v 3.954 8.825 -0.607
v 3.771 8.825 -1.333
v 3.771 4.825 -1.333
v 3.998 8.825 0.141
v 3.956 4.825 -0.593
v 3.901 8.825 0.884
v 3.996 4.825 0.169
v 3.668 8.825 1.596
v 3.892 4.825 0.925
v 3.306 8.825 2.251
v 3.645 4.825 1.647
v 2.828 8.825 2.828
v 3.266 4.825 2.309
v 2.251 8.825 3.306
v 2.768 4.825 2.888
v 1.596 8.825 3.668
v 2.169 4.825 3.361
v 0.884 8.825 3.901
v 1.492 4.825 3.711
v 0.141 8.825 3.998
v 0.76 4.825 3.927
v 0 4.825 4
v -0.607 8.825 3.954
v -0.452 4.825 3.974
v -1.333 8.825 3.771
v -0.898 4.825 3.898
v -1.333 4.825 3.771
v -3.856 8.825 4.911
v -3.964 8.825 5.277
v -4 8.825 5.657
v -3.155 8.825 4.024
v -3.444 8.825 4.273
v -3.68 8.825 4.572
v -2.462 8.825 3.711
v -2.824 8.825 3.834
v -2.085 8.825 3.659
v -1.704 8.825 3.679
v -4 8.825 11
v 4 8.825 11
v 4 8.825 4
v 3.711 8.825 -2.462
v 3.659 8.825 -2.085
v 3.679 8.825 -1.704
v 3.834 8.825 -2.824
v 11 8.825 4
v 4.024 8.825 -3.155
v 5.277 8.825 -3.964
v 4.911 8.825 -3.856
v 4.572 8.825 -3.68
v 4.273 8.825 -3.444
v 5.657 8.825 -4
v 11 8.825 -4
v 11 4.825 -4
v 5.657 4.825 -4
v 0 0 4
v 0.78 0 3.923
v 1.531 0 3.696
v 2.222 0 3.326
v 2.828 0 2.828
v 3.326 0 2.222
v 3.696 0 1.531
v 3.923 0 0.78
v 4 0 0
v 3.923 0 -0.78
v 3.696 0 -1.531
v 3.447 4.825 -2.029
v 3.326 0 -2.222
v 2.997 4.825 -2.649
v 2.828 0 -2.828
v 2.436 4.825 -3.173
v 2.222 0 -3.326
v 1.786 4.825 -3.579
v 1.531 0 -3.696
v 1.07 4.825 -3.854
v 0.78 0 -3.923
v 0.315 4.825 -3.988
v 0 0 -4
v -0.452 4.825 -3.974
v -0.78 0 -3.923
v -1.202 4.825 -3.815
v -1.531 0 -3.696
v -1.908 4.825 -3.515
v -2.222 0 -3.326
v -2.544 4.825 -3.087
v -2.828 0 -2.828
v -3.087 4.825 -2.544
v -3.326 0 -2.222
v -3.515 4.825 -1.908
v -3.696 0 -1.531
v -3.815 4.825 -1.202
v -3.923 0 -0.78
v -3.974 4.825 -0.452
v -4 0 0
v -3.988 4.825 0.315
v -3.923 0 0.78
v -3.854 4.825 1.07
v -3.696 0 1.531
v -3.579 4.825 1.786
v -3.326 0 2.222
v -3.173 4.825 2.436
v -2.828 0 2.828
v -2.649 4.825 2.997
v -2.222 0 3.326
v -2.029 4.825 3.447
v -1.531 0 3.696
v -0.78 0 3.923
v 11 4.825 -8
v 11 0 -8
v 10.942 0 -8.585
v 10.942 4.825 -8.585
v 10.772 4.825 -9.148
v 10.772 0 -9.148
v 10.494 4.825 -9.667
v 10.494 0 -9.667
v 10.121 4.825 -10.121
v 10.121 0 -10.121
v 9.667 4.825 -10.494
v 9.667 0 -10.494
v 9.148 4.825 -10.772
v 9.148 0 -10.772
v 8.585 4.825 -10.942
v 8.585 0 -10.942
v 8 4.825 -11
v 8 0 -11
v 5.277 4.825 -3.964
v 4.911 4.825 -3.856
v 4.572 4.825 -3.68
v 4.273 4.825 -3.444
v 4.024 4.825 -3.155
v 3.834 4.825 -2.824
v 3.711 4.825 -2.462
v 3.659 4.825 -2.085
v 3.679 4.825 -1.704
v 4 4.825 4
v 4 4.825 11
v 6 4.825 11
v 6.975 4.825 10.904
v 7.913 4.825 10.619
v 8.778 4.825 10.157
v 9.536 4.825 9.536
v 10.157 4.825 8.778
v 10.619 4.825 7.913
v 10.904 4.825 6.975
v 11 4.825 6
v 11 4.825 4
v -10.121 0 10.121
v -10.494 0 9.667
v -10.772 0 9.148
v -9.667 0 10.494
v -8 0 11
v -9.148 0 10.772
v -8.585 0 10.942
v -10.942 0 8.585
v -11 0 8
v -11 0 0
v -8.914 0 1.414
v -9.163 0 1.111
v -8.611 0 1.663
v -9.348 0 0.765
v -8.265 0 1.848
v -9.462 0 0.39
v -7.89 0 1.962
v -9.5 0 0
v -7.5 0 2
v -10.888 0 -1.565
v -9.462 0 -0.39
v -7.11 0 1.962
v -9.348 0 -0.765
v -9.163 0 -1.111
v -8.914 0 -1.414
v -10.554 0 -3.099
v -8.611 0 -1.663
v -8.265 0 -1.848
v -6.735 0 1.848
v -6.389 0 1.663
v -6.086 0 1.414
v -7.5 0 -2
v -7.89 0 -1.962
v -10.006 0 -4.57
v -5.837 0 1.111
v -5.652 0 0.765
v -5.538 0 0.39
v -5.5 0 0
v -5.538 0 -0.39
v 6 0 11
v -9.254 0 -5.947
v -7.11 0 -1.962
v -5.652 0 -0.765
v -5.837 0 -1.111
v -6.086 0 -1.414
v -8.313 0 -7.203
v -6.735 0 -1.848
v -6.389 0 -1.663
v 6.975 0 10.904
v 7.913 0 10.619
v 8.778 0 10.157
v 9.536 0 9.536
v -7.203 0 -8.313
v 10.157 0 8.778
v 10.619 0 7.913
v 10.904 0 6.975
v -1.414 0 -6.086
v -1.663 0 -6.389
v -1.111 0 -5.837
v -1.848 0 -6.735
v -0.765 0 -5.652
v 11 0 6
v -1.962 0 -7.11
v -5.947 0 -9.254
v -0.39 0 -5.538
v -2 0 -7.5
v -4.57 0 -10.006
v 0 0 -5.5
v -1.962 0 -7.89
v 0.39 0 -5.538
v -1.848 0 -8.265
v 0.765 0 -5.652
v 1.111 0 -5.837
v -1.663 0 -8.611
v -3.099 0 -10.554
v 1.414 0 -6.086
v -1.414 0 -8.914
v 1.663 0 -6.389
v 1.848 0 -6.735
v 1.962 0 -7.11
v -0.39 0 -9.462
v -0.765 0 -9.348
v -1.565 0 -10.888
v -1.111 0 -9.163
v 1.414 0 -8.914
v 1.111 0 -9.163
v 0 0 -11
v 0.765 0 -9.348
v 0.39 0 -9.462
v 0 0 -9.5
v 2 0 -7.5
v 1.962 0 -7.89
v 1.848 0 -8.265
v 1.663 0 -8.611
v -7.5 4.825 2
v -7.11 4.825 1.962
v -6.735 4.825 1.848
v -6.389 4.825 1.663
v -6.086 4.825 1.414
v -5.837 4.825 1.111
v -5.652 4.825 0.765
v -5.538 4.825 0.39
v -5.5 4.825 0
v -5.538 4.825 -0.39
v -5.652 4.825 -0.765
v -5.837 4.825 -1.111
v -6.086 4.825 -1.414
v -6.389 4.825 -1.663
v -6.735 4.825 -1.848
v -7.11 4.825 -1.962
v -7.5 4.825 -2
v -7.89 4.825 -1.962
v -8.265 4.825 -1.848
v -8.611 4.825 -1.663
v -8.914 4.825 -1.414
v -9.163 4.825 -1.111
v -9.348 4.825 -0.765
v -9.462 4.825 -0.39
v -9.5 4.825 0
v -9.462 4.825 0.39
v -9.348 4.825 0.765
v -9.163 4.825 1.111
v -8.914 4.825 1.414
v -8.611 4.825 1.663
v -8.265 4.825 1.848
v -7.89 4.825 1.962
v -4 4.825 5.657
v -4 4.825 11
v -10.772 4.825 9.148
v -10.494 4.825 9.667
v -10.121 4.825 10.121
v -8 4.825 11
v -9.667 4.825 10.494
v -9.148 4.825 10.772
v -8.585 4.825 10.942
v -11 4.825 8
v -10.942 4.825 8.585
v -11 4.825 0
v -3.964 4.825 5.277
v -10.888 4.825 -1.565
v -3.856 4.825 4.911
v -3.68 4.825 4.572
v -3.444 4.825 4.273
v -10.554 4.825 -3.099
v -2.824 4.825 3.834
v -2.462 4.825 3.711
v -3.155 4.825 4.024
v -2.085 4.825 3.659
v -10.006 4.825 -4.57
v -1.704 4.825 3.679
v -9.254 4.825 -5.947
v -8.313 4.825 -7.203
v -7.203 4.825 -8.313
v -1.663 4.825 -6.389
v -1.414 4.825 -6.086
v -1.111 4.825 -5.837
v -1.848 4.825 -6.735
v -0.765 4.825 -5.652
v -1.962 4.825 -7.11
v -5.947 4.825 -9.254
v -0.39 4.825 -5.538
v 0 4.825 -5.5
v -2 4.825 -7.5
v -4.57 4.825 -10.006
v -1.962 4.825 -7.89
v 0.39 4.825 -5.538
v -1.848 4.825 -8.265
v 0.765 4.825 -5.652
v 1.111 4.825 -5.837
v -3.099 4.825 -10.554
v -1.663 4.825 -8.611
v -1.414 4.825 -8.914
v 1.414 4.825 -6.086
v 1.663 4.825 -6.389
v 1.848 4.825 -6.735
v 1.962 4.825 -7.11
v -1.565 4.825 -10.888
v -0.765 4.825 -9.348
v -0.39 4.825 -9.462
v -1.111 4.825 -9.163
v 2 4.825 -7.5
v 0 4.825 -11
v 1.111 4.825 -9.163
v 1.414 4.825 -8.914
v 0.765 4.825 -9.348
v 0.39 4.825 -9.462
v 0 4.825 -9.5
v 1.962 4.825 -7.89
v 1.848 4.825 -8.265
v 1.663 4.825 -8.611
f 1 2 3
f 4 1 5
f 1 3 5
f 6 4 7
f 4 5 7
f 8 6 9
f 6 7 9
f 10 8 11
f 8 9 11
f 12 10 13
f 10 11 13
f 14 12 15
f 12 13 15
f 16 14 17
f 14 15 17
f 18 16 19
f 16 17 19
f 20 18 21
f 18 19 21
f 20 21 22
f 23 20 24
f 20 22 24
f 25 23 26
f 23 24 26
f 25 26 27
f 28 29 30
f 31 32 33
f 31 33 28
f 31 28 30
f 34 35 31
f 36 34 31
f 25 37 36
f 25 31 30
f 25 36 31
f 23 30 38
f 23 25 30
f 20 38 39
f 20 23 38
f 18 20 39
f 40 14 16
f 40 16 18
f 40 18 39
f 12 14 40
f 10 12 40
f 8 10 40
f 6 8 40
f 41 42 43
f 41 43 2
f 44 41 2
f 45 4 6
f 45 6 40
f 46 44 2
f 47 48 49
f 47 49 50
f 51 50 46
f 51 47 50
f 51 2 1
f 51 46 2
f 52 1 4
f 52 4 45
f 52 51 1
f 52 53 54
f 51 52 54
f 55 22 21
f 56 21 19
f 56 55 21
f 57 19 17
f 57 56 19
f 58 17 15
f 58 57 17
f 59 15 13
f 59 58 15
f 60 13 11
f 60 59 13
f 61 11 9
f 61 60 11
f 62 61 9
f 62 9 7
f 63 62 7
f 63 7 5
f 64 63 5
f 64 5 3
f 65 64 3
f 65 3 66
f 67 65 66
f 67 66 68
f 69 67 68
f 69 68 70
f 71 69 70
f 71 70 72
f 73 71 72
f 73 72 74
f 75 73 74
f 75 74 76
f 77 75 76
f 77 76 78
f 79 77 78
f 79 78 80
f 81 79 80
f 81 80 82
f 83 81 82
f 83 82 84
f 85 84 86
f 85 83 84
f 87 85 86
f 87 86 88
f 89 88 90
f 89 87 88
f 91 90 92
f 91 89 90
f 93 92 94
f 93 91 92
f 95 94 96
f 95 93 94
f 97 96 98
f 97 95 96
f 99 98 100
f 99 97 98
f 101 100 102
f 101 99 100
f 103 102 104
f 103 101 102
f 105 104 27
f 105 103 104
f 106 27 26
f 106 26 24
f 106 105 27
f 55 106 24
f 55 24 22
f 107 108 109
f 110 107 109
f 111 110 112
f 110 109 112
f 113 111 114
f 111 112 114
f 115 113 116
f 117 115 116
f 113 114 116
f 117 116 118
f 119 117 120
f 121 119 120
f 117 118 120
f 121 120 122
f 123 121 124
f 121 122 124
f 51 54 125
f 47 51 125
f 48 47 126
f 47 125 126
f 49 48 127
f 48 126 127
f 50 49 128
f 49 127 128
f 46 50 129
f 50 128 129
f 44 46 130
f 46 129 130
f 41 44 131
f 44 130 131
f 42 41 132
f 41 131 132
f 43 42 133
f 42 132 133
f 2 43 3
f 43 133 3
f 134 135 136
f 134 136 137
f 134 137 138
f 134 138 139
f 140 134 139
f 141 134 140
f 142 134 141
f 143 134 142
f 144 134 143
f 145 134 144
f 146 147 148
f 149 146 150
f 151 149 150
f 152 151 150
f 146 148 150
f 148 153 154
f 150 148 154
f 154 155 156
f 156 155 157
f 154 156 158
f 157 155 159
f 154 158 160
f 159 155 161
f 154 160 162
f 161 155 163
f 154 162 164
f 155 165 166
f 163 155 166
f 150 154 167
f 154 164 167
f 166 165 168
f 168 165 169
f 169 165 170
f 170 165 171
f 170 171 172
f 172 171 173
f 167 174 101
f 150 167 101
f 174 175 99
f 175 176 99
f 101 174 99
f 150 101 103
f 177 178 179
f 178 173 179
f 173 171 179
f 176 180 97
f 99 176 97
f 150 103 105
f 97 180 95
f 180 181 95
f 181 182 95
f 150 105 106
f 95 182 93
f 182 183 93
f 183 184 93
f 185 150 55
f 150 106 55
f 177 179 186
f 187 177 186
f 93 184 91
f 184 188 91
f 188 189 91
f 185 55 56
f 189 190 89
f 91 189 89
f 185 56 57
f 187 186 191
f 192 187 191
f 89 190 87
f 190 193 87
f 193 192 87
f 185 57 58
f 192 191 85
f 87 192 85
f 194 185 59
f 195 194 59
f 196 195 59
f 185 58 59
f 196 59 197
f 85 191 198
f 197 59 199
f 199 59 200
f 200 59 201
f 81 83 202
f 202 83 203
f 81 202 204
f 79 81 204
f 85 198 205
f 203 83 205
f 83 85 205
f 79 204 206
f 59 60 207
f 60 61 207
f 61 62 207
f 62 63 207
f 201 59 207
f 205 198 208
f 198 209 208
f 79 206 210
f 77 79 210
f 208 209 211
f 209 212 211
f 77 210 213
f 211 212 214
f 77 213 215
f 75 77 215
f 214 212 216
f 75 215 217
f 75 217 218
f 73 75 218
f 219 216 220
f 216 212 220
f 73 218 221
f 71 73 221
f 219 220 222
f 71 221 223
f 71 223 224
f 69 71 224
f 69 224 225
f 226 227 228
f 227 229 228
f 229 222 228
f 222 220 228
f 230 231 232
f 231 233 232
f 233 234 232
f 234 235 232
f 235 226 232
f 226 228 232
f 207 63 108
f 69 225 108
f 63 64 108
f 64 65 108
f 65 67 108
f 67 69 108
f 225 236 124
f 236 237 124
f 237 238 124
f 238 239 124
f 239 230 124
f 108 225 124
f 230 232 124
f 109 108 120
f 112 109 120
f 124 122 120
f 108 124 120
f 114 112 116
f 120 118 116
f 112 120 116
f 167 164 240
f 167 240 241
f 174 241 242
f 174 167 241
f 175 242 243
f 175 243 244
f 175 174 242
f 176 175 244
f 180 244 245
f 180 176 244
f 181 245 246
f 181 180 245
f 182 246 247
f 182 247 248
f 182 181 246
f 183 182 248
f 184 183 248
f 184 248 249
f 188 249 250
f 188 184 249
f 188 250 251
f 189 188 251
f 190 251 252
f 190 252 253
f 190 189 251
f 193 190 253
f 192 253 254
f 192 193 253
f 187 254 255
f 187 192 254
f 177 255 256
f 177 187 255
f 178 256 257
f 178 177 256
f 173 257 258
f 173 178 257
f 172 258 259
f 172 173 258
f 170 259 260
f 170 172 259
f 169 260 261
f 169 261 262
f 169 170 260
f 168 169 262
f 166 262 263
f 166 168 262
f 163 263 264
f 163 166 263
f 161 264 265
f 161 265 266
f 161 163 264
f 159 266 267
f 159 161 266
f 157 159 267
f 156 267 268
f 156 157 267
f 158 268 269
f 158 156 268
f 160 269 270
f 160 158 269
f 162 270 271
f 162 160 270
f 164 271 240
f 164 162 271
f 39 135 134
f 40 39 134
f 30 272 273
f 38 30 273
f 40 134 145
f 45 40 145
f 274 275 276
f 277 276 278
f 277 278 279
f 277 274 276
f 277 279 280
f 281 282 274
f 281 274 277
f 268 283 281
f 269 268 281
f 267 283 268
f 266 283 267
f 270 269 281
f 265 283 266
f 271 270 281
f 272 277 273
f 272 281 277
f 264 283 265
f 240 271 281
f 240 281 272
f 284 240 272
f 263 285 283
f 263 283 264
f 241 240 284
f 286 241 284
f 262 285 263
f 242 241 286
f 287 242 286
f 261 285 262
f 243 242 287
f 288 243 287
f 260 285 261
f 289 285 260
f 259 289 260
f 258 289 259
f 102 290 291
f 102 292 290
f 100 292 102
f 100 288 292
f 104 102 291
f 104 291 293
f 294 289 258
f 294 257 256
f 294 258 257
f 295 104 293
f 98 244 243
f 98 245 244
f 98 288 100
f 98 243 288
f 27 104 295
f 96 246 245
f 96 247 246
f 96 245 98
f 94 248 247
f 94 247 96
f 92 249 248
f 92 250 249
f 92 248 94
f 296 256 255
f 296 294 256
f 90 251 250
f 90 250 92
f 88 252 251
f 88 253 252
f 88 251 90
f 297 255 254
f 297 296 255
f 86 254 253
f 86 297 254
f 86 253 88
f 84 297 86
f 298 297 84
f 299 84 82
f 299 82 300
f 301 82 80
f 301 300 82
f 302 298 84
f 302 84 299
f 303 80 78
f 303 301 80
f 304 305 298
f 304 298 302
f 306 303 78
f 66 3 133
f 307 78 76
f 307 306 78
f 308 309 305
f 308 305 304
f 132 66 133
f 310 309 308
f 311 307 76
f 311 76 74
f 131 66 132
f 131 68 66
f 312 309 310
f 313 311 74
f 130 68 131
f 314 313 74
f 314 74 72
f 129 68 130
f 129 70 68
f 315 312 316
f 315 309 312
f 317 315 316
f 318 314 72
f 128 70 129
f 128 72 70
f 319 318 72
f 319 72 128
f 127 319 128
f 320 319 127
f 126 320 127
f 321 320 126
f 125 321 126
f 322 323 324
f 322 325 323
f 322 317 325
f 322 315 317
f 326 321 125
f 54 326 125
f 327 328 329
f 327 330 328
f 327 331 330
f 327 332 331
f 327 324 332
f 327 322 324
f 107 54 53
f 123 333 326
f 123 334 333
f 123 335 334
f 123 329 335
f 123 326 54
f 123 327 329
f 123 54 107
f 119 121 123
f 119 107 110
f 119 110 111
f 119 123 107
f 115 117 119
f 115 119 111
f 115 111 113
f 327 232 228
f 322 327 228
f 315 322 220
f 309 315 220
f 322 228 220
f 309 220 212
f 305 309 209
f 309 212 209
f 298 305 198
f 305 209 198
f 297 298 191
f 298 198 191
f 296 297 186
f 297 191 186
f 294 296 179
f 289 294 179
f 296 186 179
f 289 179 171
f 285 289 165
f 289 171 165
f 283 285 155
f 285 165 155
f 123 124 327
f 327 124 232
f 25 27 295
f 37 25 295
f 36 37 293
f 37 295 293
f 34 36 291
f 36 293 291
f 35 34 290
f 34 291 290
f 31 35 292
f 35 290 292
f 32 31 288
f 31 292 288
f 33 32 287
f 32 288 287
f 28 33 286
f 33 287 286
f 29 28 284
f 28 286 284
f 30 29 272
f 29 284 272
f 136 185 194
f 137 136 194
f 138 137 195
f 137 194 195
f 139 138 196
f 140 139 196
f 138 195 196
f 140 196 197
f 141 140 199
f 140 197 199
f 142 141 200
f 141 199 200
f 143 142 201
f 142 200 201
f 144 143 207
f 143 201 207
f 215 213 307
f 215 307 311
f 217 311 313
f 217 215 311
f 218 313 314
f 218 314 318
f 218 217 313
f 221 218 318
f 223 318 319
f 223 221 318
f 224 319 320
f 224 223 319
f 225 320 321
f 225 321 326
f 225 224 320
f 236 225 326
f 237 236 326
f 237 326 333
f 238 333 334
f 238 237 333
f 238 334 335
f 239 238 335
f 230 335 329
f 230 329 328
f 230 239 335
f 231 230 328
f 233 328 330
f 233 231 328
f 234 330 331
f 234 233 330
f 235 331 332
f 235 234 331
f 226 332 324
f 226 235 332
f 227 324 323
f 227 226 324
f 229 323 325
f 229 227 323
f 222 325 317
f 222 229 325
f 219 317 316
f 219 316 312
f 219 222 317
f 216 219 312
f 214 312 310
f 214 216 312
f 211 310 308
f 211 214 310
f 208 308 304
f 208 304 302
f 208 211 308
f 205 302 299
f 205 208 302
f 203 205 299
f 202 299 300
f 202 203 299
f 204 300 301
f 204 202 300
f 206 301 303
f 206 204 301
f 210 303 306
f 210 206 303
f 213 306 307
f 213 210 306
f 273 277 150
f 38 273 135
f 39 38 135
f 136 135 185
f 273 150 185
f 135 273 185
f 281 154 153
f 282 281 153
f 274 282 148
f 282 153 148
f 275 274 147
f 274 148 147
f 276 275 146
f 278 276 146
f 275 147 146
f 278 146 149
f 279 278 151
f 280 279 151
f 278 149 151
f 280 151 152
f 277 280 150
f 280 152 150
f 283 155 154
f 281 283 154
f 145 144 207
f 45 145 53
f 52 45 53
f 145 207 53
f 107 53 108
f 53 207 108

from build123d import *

# Parameters (mm, degrees)
SKETCH1_R           = 4
SKETCH1_R_2         = 2
BOSS_EXTRUDE1_DEPTH = 4.825
BOSS_EXTRUDE2_DEPTH = 4


with BuildPart() as part:
    # Sketch1 → Boss-Extrude1 (new body)
    with BuildSketch(Plane(origin=(0, 0, 0), x_dir=(1, 0, 0), z_dir=(0, 1, 0))):
        with BuildLine():
            Line((-11, 0), (-11, -8))
            ThreePointArc((-11, -8), (-10.121320344, -10.121320344), (-8, -11))
            Line((-8, -11), (6, -11))
            ThreePointArc((6, -11), (9.535533906, -9.535533906), (11, -6))
            Line((11, -6), (11, 8))
            ThreePointArc((11, 8), (10.121320344, 10.121320344), (8, 11))
            Line((8, 11), (0, 11))
            ThreePointArc((0, 11), (-7.778174593, 7.778174593), (-11, 0))
        make_face()
        with Locations(Location((0, 0, 0), (0, 0, 270))):  # turned: the seam where the file's is
            Circle(SKETCH1_R, mode=Mode.SUBTRACT)
        with Locations(Location((-7.5, 0, 0), (0, 0, 270))):  # turned: the seam where the file's is
            Circle(SKETCH1_R_2, mode=Mode.SUBTRACT)
        with Locations(Location((0, 7.5, 0), (0, 0, 270))):  # turned: the seam where the file's is
            Circle(SKETCH1_R_2, mode=Mode.SUBTRACT)
    extrude(amount=BOSS_EXTRUDE1_DEPTH)

    # Sketch2 → Boss-Extrude2 (add)
    with BuildSketch(Plane(origin=(0, 4.825, 0), x_dir=(1, 0, 0), z_dir=(0, 1, 0))):
        with BuildLine():
            Line((4, -11), (4, -4))
            Line((4, -4), (11, -4))
            Line((11, -4), (11, 4))
            Line((11, 4), (5.656854249, 4))
            ThreePointArc((5.656854249, 4), (4.023861088, 3.154700538), (3.771236166, 1.333333333))
            ThreePointArc((3.771236166, 1.333333333), (2.828427125, -2.828427125), (-1.333333333, -3.771236166))
            ThreePointArc((-1.333333333, -3.771236166), (-3.154700538, -4.023861088), (-4, -5.656854249))
            Line((-4, -5.656854249), (-4, -11))
            Line((-4, -11), (4, -11))
        make_face()
    extrude(amount=BOSS_EXTRUDE2_DEPTH)


solid = part.part
